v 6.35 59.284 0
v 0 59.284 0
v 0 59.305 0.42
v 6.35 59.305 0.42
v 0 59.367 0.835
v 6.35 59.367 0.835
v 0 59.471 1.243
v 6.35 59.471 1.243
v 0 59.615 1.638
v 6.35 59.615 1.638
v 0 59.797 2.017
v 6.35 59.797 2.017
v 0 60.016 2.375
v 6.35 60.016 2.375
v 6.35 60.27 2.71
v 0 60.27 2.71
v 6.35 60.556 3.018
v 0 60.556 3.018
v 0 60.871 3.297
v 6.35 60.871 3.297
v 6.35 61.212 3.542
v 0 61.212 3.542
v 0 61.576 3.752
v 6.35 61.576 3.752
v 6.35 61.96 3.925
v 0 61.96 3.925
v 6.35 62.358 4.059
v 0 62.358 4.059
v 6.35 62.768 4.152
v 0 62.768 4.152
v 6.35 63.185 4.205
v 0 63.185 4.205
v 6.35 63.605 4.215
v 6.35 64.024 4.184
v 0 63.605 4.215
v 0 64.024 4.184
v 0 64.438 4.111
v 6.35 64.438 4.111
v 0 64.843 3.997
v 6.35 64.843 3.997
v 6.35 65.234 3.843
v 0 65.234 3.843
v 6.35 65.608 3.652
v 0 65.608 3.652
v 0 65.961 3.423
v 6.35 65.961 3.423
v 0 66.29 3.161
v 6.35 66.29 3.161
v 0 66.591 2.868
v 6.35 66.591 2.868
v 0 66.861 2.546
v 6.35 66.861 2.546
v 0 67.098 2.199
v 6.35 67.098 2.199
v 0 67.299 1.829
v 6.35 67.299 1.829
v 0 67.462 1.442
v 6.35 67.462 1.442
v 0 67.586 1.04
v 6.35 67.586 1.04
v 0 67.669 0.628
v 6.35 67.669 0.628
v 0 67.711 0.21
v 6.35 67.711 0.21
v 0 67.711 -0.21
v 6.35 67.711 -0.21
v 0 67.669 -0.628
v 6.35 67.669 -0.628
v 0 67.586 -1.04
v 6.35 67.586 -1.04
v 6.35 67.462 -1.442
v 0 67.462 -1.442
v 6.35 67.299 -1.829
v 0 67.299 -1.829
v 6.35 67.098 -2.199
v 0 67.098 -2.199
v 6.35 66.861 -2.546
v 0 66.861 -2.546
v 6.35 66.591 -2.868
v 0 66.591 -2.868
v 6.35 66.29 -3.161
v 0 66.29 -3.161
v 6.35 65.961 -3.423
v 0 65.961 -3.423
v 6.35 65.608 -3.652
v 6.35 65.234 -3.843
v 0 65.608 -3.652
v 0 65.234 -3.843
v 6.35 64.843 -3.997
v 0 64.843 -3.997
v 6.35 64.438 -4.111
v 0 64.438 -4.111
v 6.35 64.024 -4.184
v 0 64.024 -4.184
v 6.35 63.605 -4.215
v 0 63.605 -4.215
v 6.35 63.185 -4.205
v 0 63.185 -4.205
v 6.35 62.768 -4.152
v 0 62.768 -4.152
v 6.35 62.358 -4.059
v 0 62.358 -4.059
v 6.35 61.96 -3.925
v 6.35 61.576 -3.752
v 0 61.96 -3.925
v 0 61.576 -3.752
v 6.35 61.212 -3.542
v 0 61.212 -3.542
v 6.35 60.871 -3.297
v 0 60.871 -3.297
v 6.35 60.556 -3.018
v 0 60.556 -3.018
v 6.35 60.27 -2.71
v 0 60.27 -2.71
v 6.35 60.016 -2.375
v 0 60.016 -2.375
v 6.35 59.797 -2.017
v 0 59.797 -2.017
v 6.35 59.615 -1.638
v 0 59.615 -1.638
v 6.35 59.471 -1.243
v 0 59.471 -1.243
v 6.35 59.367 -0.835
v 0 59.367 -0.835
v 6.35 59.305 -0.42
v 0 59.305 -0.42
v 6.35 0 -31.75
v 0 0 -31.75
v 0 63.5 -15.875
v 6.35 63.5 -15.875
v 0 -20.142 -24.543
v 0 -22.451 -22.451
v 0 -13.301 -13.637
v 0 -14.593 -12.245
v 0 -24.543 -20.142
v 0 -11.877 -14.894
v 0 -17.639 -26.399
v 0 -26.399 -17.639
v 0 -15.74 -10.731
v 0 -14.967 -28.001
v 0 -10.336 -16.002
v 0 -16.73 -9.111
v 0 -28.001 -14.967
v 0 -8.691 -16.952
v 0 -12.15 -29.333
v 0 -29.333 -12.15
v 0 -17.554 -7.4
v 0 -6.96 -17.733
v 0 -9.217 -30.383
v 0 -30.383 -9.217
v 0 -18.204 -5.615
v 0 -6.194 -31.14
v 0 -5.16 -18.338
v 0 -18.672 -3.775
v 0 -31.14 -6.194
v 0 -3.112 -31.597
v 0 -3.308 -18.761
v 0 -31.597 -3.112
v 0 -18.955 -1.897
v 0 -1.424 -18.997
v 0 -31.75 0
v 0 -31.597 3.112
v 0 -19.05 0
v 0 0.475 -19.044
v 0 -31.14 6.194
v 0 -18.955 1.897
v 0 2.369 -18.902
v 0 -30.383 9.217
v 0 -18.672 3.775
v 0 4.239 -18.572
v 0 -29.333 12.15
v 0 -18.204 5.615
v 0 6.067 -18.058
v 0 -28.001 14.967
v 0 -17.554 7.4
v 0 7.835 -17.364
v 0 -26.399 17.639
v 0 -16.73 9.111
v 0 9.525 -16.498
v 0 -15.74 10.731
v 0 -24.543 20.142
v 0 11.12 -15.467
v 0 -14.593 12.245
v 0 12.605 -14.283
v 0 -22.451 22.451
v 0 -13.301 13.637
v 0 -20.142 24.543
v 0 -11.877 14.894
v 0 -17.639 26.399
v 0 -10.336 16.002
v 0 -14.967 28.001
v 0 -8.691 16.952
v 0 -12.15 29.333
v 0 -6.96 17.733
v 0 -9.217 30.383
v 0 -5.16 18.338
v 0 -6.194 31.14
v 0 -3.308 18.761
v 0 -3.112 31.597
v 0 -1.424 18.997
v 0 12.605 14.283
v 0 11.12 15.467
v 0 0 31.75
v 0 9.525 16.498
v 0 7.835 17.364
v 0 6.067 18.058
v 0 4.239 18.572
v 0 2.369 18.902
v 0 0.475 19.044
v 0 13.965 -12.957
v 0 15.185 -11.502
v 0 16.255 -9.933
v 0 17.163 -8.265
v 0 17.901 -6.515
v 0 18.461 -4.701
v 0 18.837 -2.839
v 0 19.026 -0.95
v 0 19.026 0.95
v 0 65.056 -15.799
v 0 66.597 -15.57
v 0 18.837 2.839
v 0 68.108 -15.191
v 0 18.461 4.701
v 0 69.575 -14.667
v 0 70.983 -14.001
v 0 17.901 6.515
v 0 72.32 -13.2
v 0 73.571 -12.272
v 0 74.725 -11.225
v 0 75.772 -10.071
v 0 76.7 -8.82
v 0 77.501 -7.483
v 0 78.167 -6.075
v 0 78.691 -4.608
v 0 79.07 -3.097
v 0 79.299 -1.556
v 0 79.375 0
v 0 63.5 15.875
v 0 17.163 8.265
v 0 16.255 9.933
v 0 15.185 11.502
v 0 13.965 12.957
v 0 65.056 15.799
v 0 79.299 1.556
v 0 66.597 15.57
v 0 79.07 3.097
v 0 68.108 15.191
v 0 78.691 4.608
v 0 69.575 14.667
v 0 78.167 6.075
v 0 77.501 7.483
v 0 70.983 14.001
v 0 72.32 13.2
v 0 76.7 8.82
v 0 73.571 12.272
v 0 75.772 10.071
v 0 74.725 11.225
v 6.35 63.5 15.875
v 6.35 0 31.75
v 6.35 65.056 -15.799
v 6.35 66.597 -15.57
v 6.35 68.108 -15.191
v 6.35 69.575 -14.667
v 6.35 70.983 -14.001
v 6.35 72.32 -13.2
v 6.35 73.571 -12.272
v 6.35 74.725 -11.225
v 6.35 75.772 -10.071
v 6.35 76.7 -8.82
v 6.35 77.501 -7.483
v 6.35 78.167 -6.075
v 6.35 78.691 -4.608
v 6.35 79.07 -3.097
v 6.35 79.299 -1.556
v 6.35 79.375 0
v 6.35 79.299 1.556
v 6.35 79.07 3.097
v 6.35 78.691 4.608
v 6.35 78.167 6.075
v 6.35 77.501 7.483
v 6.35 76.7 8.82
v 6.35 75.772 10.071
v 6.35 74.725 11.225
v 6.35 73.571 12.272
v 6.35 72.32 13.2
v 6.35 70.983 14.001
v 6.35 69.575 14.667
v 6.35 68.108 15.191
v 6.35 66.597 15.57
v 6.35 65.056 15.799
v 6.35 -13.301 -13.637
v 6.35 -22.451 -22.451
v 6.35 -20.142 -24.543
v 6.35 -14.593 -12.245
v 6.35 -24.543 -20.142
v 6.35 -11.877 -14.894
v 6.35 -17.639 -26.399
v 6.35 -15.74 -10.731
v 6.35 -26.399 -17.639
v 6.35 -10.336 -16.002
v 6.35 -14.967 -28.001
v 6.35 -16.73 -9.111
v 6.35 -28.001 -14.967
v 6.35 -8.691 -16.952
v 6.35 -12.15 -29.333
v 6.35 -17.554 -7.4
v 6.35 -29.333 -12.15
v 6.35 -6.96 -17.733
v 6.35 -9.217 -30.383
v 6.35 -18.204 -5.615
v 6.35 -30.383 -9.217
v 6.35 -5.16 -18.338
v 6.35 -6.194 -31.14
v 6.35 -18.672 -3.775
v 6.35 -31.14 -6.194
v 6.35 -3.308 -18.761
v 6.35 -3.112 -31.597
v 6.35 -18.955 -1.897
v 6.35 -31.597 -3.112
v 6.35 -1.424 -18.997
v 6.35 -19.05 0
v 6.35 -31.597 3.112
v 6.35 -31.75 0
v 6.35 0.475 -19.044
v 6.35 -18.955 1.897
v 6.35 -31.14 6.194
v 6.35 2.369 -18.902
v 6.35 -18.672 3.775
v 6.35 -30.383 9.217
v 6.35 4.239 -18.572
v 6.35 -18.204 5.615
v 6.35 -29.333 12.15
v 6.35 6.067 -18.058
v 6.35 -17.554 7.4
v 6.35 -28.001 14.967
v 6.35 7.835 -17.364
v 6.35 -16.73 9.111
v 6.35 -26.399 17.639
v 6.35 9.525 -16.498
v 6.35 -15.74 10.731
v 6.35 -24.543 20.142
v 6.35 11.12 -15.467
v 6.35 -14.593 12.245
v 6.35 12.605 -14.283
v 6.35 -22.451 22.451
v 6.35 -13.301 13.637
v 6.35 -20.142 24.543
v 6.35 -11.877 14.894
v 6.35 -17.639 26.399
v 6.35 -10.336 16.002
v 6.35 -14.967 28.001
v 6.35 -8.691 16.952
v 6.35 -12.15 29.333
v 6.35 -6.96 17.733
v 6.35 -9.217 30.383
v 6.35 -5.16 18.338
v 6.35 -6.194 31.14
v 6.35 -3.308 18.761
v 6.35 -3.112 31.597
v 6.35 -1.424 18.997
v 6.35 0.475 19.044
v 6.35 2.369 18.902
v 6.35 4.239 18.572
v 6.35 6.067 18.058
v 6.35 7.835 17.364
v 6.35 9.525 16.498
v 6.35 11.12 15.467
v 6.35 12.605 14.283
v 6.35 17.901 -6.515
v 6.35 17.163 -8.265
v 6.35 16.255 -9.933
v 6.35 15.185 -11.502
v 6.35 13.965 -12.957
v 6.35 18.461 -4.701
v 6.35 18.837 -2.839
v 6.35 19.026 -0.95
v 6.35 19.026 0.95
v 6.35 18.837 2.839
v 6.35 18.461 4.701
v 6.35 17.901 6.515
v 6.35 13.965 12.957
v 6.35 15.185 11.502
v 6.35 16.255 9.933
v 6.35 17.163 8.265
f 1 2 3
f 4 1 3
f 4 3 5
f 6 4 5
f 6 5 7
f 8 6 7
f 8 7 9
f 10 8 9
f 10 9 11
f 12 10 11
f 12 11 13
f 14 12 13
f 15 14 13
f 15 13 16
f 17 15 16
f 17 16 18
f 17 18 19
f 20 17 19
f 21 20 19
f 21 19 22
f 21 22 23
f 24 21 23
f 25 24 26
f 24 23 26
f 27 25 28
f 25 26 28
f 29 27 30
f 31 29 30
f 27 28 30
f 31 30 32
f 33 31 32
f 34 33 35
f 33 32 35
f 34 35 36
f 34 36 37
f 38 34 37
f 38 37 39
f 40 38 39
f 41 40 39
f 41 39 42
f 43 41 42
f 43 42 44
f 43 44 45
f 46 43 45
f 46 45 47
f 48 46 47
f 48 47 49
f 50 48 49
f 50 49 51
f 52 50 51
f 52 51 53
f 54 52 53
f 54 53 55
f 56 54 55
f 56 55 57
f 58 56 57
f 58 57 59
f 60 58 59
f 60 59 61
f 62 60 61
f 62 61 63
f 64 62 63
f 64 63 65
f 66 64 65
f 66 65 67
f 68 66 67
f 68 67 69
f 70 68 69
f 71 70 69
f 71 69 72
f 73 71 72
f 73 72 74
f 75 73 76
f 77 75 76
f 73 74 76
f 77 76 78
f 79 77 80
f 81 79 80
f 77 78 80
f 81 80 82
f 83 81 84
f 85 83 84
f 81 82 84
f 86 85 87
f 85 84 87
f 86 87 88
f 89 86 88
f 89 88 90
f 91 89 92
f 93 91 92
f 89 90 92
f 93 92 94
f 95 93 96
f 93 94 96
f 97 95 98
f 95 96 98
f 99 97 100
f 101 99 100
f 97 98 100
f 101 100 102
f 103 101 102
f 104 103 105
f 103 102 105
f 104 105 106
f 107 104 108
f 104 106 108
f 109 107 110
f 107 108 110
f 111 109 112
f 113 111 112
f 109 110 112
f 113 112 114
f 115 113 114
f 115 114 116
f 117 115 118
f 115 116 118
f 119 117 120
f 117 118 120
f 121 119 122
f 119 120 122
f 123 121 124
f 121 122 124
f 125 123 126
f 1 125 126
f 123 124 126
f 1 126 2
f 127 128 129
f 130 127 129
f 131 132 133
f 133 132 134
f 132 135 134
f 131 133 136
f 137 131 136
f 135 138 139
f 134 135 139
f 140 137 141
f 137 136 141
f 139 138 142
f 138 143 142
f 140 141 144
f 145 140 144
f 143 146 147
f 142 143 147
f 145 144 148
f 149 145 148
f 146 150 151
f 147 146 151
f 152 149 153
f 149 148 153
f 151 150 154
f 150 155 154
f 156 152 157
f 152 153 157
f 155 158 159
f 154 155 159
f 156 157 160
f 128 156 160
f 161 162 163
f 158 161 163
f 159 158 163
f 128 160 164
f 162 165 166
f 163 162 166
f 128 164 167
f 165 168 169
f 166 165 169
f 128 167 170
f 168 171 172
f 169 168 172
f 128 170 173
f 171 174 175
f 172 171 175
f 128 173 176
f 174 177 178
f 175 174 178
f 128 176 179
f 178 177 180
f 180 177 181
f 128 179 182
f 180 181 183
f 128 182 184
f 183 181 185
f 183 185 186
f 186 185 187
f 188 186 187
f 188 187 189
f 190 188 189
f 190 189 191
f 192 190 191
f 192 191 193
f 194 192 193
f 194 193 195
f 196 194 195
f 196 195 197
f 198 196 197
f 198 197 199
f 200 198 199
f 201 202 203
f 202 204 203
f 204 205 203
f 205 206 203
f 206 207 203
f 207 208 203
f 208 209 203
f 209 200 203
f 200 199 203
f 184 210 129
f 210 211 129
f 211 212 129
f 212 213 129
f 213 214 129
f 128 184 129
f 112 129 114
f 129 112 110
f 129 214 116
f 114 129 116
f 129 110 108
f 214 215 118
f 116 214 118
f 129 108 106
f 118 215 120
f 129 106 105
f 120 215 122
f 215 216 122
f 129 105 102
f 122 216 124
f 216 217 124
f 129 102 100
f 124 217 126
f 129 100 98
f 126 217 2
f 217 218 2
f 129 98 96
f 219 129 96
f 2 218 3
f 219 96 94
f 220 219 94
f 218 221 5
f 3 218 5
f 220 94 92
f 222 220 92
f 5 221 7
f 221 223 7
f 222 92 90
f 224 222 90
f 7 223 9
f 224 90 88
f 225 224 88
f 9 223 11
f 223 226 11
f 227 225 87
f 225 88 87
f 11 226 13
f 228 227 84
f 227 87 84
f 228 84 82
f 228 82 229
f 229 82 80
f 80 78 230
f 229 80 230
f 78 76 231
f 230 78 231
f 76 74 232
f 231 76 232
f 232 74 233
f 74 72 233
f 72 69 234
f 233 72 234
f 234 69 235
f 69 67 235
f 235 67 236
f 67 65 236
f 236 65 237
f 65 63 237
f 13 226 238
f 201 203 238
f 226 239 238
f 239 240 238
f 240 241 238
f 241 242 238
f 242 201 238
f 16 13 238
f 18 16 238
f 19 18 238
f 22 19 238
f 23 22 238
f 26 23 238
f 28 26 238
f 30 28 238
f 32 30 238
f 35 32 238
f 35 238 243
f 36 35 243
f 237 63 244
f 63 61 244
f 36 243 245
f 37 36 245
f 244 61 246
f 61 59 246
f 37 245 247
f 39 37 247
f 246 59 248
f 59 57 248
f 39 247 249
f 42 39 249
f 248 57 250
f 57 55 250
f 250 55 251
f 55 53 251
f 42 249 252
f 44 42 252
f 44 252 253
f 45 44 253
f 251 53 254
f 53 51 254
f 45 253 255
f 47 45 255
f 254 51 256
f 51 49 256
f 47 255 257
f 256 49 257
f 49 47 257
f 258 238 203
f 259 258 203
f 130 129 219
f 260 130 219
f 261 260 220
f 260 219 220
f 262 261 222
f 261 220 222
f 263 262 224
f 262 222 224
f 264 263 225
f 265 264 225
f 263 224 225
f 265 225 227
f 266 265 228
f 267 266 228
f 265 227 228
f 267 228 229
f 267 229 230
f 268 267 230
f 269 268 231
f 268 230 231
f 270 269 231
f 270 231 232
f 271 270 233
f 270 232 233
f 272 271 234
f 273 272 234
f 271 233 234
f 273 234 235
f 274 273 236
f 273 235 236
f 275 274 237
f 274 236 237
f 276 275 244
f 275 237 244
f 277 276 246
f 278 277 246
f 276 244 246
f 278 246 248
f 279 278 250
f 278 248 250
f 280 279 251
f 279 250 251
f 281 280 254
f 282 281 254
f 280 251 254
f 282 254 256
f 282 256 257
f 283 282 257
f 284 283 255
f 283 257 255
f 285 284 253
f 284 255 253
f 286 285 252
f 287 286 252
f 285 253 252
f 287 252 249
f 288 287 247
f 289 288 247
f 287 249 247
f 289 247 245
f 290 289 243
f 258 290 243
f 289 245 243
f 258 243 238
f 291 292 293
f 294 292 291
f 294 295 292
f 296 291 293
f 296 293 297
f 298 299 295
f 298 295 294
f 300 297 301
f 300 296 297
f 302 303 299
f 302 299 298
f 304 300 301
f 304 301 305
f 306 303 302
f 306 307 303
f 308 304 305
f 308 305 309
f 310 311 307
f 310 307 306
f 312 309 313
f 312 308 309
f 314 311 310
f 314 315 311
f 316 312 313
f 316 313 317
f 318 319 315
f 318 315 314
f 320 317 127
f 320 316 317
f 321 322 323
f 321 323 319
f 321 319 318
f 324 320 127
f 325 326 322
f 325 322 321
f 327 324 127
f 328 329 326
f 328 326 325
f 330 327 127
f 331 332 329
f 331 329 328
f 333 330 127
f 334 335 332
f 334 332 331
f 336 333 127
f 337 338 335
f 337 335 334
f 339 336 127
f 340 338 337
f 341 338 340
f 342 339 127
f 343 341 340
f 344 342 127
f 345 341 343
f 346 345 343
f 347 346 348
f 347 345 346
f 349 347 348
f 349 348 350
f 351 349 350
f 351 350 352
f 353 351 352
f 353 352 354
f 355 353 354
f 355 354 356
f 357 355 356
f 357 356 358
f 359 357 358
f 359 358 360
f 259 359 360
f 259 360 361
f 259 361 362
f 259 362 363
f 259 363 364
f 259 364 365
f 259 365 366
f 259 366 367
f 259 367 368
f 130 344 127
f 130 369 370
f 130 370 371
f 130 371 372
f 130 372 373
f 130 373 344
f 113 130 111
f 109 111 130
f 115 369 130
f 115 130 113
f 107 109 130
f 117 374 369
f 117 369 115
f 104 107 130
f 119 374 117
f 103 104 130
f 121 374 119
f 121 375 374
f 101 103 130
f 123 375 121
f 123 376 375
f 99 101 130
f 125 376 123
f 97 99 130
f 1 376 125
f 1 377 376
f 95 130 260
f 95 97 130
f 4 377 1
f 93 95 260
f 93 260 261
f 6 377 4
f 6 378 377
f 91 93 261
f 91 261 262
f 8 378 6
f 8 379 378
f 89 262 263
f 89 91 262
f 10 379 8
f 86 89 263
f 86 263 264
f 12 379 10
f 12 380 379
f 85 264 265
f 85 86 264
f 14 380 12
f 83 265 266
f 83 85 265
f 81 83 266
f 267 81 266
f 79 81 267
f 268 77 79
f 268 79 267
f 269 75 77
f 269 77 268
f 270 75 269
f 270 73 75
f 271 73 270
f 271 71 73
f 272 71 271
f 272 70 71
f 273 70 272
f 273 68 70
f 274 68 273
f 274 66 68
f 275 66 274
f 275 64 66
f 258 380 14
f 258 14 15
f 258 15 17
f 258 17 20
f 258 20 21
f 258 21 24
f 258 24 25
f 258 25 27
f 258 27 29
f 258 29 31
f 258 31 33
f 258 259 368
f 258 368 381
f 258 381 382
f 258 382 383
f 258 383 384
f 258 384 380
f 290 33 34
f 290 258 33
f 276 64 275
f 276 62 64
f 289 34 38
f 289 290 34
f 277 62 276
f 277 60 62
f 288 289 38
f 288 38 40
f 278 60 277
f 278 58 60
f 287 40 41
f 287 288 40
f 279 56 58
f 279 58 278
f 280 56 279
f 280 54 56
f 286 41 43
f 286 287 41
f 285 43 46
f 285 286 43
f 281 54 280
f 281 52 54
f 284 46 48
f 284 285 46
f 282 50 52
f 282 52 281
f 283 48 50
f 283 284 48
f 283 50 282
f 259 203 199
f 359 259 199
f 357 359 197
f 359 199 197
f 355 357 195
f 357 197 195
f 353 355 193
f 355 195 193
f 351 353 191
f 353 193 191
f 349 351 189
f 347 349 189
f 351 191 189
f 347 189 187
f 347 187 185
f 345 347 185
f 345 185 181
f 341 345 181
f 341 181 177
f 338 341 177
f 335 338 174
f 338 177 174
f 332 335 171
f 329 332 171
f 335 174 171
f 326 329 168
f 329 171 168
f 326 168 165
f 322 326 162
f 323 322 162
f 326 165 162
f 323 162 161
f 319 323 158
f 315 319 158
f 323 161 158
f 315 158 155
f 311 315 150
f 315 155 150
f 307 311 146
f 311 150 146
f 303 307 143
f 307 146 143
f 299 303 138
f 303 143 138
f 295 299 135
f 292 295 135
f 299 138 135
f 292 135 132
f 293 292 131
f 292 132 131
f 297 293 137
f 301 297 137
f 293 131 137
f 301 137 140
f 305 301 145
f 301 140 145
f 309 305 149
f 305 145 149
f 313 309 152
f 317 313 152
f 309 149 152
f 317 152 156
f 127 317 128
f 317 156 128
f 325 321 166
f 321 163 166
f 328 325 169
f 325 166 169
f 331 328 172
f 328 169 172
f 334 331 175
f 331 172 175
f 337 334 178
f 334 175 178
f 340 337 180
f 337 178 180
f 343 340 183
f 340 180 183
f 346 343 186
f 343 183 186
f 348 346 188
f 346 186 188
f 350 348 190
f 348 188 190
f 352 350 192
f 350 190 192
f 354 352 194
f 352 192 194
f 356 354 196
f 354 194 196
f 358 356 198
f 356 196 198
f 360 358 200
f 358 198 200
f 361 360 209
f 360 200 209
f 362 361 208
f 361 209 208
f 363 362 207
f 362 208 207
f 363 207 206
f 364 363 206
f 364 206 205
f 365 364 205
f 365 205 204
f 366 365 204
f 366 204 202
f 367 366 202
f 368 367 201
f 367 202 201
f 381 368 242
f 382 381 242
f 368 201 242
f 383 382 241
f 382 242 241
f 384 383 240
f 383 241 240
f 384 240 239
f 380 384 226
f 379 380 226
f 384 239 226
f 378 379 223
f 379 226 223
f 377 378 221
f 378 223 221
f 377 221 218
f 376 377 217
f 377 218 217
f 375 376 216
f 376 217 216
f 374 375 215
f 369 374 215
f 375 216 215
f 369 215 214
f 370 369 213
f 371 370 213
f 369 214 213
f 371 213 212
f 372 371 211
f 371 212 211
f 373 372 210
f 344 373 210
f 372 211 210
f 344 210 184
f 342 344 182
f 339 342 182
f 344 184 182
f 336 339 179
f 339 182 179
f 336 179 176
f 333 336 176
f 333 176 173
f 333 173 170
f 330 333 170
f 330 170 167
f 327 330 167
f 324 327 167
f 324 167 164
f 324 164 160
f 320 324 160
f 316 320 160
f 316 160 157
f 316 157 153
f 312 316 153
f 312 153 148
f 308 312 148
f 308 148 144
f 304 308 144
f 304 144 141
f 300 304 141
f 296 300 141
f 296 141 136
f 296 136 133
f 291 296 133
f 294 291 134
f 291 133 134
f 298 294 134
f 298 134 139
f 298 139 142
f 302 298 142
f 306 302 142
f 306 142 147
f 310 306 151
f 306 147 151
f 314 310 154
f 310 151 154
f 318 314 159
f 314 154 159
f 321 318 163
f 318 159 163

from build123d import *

# Parameters (mm, degrees)
F1_DEPTH = 6.35
F3_D     = 38.1
F3_DEPTH = 6.35
F3_TIP   = 11.4463947925
F4_D     = 8.4328


with BuildPart() as f1:
    # F0 (on Right) → F1 (new body)
    with BuildSketch(Plane.YZ):
        with BuildLine():
            Line((63.5, 15.875), (0, 31.75))
            ThreePointArc((0, 31.75), (-31.75, 0), (0, -31.75))
            Line((0, -31.75), (63.5, -15.875))
            ThreePointArc((63.5, -15.875), (79.375, 0), (63.5, 15.875))
        make_face()
    extrude(amount=F1_DEPTH)

    # F3
    with Locations(Plane.YZ.offset(6.35)):
        with Locations((0, 0)):
            Hole(F3_D / 2, depth=F3_DEPTH)
            with Locations((0, 0, -(F3_DEPTH + F3_TIP / 2))):  # 118° drill point
                Cone(0, F3_D / 2, F3_TIP, mode=Mode.SUBTRACT)

    # F4 (through all)
    with Locations(Plane.YZ.offset(6.35)):
        with Locations((63.5, 0)):
            Hole(F4_D / 2)


solid = f1.part
